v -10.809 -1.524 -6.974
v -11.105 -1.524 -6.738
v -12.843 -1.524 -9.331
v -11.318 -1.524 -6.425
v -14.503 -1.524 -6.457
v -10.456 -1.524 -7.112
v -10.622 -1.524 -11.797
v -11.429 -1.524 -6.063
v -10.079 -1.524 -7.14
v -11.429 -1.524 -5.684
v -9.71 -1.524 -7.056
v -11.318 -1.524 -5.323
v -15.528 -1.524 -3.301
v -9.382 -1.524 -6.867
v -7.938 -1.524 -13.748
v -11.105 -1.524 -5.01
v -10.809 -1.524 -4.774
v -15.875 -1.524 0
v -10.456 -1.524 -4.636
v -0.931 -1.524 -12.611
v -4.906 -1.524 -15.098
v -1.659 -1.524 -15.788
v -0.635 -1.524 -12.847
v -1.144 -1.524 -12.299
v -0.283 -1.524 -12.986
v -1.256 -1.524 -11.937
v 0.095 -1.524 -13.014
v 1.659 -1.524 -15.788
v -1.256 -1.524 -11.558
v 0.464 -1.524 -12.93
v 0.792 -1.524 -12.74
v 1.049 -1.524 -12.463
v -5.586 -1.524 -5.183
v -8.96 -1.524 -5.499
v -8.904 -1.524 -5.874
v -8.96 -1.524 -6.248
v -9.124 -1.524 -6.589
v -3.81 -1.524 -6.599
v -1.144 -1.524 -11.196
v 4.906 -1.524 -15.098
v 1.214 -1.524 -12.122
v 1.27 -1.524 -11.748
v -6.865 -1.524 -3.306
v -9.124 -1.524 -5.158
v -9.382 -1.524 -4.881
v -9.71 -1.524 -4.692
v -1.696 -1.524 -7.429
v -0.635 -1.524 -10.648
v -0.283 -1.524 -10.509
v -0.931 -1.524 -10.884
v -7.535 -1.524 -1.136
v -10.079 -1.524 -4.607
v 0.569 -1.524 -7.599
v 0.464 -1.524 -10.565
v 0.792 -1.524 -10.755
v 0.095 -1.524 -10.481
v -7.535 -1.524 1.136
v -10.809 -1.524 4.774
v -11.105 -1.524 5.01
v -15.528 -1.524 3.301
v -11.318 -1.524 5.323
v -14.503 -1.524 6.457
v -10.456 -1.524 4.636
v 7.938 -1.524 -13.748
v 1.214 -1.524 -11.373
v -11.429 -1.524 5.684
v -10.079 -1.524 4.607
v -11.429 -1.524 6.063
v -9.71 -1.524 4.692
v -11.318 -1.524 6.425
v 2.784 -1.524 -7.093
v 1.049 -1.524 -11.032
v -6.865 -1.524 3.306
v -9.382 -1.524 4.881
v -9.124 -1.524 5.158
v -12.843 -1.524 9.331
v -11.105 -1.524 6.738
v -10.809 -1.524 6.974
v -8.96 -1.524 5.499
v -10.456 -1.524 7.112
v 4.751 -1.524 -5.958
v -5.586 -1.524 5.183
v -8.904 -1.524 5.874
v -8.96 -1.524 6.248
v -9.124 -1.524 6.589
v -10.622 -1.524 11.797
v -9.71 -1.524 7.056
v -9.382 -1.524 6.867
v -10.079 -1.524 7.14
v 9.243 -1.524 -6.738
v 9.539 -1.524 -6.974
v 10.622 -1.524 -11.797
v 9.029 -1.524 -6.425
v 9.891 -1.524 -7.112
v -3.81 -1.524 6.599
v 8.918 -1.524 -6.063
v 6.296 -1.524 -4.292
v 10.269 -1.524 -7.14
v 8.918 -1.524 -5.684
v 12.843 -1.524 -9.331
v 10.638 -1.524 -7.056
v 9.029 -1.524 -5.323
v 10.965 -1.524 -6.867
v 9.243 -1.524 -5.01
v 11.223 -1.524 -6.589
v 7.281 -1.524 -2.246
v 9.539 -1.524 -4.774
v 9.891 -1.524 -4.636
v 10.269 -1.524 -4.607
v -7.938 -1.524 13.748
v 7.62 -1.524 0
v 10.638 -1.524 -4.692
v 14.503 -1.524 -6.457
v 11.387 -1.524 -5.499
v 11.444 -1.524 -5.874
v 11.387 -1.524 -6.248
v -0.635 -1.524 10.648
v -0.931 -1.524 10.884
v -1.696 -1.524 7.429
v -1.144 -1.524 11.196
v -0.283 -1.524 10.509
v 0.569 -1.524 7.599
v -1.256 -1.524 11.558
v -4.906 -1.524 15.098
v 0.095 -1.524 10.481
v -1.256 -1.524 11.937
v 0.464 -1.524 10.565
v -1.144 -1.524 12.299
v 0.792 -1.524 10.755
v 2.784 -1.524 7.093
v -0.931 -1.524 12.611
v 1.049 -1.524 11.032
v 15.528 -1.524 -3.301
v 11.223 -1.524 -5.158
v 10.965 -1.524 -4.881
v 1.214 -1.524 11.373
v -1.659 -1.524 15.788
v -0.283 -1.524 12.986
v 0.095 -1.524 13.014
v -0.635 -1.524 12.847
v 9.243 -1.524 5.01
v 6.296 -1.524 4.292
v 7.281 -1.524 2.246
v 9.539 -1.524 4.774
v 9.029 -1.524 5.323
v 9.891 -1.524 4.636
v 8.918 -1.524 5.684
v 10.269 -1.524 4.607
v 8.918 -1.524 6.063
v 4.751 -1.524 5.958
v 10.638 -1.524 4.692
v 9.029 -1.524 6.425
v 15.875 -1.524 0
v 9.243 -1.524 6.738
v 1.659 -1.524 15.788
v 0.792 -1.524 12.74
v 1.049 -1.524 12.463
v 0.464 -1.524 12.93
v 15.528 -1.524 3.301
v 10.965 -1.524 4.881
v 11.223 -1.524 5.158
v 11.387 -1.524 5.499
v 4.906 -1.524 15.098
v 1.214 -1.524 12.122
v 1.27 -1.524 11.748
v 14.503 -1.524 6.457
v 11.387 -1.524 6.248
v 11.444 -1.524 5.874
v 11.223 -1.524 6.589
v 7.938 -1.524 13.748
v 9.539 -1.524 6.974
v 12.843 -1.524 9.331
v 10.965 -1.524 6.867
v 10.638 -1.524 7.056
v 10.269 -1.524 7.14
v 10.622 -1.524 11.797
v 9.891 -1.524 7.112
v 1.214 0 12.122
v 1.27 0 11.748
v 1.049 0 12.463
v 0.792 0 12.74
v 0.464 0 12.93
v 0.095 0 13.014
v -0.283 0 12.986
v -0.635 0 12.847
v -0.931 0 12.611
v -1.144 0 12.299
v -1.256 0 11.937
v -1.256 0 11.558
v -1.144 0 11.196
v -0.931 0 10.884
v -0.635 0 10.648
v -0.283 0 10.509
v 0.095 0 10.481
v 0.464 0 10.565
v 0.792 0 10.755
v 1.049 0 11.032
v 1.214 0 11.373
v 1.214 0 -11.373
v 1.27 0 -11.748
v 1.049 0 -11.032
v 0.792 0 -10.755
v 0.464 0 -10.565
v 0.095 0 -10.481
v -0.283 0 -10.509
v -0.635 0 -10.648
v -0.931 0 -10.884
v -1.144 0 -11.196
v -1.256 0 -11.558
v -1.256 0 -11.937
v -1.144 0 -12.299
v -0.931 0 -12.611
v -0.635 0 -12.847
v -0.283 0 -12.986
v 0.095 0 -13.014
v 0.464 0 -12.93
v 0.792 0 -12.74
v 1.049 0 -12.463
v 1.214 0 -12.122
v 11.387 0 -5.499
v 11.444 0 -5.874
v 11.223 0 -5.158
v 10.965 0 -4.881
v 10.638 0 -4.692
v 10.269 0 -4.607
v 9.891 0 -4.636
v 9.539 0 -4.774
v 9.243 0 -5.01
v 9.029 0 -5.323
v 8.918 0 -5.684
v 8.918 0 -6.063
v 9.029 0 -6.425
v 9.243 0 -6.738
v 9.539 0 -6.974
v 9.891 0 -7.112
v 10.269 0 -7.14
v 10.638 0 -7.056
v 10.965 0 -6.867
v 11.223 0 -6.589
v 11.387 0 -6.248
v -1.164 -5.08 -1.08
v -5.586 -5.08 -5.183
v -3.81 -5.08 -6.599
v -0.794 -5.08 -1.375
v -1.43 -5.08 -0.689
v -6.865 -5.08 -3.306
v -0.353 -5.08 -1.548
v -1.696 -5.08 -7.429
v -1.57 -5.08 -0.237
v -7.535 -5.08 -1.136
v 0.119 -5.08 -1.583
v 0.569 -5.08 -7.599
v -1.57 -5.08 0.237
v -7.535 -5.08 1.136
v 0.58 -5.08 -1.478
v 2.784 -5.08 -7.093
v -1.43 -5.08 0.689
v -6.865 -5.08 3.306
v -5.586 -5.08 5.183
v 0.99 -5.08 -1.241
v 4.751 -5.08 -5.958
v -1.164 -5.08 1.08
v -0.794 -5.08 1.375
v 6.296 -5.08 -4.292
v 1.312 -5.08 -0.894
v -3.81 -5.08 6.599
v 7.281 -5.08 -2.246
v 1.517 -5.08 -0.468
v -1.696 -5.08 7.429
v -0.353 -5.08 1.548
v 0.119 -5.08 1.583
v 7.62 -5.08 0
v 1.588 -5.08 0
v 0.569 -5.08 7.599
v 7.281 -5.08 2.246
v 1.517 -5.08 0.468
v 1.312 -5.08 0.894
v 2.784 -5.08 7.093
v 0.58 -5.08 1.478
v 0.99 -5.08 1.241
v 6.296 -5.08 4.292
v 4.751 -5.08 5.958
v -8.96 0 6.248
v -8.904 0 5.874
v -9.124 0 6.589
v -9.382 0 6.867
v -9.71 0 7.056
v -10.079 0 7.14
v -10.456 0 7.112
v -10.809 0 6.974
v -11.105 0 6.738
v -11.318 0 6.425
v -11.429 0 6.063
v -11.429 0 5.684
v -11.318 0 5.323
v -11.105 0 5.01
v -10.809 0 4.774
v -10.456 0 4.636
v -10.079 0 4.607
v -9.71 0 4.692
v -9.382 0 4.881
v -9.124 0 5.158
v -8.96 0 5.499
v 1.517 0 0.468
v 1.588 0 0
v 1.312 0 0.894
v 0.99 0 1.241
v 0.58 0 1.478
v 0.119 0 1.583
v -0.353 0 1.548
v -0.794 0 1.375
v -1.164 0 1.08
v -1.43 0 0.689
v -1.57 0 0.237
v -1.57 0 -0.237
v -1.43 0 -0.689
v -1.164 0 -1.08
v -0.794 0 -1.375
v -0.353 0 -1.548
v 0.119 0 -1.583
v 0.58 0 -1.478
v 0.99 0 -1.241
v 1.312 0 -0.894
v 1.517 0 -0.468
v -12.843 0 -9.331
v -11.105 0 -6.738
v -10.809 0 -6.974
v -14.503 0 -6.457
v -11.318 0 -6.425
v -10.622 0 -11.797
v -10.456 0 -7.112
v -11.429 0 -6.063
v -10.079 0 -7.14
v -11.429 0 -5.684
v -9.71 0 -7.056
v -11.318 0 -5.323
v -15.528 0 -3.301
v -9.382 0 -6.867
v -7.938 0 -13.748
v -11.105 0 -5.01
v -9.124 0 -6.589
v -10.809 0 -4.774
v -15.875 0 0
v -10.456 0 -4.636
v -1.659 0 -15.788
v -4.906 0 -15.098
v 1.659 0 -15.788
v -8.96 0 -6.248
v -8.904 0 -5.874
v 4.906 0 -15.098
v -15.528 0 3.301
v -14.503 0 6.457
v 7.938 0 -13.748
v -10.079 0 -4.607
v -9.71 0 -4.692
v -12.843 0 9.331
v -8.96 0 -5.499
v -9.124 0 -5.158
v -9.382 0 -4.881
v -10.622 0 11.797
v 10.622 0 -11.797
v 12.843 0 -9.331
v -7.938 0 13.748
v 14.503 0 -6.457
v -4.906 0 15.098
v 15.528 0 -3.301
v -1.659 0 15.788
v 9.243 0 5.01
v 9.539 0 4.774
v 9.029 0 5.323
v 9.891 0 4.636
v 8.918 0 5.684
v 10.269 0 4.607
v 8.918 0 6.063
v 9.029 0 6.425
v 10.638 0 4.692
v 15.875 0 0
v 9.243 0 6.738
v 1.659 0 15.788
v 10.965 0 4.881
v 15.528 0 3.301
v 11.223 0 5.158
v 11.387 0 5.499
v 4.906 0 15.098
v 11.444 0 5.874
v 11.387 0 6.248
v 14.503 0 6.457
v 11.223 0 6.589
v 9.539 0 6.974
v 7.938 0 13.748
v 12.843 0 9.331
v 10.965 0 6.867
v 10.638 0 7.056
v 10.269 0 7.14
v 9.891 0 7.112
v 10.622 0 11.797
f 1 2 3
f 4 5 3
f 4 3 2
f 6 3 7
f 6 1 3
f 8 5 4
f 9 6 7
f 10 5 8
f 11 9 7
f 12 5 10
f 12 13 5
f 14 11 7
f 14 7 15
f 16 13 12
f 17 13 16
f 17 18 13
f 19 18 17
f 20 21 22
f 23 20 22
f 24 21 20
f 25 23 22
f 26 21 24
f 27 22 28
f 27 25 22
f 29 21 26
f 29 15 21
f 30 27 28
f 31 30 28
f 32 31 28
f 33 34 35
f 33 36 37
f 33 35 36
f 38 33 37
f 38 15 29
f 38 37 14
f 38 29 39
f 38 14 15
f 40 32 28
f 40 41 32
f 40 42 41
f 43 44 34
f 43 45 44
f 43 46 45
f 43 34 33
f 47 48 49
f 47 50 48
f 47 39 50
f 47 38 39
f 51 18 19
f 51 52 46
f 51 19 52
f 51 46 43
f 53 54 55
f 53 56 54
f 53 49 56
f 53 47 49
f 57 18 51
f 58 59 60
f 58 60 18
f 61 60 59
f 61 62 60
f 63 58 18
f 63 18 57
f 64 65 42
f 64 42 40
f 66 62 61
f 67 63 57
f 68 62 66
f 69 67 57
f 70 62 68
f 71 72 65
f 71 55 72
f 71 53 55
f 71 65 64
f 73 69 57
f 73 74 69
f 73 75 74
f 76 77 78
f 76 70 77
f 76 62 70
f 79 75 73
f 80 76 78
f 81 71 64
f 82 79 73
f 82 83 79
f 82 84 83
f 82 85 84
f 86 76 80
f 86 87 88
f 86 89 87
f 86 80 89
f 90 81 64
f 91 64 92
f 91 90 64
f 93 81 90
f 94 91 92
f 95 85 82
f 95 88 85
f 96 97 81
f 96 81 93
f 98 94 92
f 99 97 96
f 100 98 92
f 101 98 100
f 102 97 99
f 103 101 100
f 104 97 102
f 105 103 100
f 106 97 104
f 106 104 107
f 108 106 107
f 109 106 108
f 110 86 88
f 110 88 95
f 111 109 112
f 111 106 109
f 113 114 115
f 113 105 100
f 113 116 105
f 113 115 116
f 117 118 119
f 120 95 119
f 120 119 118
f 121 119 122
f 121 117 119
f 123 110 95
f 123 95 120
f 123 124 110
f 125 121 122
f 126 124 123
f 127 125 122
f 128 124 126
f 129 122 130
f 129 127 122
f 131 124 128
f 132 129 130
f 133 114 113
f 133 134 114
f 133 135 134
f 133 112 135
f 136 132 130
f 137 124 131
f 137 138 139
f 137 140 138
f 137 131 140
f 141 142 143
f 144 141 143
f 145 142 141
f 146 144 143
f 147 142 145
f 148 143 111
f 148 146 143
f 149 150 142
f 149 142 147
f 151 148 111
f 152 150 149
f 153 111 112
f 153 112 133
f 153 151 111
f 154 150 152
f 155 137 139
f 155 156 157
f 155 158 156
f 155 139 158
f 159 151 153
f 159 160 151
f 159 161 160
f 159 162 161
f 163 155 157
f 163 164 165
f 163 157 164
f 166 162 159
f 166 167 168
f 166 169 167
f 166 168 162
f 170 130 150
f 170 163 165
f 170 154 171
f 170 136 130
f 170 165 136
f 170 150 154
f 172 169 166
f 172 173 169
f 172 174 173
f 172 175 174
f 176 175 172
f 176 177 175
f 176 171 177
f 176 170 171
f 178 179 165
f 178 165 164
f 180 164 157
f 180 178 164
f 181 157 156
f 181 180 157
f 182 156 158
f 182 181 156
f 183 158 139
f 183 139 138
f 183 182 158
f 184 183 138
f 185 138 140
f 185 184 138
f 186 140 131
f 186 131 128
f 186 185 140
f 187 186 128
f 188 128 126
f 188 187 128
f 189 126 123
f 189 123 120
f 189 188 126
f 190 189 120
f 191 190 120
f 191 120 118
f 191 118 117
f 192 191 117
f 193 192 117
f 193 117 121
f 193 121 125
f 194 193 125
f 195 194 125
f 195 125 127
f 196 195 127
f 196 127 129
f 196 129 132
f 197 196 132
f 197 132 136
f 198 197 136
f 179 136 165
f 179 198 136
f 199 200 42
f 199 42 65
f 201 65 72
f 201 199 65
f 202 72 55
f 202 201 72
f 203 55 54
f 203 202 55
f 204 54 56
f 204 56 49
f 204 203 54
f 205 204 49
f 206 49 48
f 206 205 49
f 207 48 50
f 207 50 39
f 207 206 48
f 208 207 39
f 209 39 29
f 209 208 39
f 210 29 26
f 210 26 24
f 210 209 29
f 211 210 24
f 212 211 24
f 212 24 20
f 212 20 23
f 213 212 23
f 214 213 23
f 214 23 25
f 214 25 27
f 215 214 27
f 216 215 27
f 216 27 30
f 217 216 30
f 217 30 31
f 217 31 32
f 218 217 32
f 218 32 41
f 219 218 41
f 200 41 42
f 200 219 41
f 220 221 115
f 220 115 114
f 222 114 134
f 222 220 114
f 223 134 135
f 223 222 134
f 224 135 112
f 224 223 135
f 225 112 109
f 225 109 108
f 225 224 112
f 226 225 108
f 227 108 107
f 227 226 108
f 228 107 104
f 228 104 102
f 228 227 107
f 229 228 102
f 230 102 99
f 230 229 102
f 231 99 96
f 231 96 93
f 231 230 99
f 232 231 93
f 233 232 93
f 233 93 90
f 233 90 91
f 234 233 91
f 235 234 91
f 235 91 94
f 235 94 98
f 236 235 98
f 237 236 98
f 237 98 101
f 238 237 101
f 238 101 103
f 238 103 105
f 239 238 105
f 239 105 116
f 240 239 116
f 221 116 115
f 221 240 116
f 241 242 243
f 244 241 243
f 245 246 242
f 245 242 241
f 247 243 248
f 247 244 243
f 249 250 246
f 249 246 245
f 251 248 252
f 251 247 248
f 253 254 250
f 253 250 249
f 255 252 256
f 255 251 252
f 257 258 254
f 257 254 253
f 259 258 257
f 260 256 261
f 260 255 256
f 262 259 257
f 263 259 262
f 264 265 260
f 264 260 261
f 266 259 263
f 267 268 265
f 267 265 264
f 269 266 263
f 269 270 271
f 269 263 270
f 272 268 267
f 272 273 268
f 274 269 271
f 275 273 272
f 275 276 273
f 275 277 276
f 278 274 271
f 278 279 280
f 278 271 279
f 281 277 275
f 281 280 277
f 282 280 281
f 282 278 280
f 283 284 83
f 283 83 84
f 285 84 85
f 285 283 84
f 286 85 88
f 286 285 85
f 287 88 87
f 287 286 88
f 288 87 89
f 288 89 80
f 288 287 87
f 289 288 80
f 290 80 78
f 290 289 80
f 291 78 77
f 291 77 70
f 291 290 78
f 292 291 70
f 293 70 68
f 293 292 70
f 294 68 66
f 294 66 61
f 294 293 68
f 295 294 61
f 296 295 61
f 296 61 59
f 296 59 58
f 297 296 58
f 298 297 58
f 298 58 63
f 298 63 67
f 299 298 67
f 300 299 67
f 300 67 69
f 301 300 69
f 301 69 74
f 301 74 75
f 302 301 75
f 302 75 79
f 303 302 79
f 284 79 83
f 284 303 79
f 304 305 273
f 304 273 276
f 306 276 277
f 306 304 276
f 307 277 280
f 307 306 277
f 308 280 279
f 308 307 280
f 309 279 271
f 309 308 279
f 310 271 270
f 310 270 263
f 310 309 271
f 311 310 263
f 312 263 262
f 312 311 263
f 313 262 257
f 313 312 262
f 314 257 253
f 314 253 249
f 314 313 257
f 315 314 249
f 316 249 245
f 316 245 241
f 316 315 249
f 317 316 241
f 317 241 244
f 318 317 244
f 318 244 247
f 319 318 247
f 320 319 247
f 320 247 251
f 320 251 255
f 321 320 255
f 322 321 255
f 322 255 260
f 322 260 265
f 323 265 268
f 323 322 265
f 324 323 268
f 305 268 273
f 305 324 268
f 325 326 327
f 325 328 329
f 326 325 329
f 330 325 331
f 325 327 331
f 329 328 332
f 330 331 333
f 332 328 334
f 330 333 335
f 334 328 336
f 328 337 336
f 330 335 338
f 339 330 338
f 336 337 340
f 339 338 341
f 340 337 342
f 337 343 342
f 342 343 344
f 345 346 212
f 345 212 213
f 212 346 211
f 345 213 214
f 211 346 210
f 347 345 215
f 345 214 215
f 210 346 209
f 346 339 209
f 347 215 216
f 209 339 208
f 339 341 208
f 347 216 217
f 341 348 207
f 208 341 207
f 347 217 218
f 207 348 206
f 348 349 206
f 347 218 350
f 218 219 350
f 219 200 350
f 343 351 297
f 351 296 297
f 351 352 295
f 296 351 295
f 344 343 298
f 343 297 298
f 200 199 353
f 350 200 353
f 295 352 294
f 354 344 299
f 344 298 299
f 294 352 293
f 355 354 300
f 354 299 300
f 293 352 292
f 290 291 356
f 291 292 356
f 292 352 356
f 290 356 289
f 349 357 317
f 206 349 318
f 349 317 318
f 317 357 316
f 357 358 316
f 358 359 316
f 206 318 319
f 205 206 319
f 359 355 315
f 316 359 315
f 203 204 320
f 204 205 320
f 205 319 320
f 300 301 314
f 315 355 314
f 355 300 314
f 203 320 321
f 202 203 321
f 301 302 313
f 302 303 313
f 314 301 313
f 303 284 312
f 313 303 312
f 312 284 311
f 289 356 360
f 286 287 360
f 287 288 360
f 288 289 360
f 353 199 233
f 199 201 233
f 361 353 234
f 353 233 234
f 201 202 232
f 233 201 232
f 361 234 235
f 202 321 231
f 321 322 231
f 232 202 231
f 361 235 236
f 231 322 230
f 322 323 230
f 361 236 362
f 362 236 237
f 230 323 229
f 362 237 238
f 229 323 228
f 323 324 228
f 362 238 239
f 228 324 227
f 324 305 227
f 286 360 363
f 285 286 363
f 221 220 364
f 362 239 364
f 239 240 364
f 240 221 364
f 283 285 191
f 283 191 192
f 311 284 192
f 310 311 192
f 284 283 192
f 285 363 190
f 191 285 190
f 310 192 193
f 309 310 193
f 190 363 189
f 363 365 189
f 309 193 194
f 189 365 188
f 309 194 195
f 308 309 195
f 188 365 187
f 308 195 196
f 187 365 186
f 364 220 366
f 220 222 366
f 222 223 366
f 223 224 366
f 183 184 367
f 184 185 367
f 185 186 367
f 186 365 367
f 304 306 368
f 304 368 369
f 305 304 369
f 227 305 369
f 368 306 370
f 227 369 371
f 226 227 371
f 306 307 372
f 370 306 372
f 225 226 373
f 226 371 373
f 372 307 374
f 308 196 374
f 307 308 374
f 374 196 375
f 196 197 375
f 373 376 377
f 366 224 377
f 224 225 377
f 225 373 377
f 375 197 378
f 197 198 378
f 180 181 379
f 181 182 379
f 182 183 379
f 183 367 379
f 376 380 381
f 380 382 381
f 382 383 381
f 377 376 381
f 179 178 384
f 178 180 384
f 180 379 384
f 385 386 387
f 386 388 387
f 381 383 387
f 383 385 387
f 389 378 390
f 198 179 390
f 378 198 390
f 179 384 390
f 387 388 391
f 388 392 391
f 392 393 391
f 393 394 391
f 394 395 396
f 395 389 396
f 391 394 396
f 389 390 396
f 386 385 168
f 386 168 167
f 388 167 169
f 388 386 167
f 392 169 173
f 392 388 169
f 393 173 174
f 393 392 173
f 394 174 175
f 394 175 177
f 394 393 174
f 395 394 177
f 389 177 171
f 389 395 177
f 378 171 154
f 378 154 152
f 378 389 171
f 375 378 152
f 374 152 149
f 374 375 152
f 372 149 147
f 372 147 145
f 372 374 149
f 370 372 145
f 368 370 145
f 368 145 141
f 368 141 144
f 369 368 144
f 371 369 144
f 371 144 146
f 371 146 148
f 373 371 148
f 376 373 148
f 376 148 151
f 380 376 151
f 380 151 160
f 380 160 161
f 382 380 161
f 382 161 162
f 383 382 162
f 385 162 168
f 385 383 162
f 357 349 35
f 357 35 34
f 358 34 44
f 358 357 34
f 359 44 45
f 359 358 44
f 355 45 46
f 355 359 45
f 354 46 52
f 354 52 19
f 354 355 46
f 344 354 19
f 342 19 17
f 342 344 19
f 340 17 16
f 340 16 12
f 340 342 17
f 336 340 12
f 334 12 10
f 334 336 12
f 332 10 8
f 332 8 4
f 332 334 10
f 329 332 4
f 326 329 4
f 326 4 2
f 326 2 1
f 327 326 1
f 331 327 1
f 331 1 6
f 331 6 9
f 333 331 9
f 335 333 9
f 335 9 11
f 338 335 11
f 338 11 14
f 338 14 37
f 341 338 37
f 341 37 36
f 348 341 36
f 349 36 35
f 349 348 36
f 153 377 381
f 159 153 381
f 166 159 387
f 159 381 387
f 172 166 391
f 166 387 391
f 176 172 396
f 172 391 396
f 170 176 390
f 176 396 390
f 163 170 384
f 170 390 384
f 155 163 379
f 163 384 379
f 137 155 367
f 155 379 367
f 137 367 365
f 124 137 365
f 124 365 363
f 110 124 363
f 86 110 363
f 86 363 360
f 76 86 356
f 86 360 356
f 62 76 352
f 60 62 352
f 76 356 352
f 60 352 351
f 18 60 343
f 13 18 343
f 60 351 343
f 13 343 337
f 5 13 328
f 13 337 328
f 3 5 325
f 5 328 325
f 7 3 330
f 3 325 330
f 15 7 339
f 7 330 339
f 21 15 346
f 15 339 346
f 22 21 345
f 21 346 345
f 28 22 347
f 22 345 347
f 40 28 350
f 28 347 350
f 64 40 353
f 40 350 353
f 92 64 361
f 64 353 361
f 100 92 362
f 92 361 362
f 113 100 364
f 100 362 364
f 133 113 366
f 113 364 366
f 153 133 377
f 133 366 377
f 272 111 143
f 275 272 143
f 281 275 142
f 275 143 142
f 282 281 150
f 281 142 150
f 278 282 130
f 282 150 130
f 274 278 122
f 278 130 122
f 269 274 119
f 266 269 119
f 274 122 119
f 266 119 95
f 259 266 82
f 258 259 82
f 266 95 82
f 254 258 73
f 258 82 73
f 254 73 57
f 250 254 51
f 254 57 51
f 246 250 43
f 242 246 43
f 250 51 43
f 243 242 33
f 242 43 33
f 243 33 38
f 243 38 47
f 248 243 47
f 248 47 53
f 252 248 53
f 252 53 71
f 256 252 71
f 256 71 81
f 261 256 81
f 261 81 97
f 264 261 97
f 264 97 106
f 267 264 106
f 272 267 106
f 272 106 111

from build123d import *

# Parameters (mm, degrees)
F0_R     = 15.875
F0_R_2   = 1.27
F0_R_3   = 7.62
F1_DEPTH = 1.524
F0_R_4   = 1.5875
F2_DEPTH = 5.08


with BuildPart() as f1:
    # F0 (on Front) → F1 (new body)
    with BuildSketch(Plane.XZ):
        Circle(F0_R)
        with Locations((-10.173633, -5.87375)):
            Circle(F0_R_2, mode=Mode.SUBTRACT)
        with Locations((0, -11.7475)):
            Circle(F0_R_2, mode=Mode.SUBTRACT)
        with Locations((10.173633, -5.87375)):
            Circle(F0_R_2, mode=Mode.SUBTRACT)
        with Locations((-10.173633, 5.87375)):
            Circle(F0_R_2, mode=Mode.SUBTRACT)
        Circle(F0_R_3, mode=Mode.SUBTRACT)
        with Locations((10.173633, 5.87375)):
            Circle(F0_R_2, mode=Mode.SUBTRACT)
        with Locations((0, 11.7475)):
            Circle(F0_R_2, mode=Mode.SUBTRACT)
    extrude(amount=F1_DEPTH)

    # F0 (on Front) → F2 (join)
    with BuildSketch(Plane.XZ):
        Circle(F0_R_3)
        Circle(F0_R_4, mode=Mode.SUBTRACT)
    extrude(amount=F2_DEPTH)


solid = f1.part
